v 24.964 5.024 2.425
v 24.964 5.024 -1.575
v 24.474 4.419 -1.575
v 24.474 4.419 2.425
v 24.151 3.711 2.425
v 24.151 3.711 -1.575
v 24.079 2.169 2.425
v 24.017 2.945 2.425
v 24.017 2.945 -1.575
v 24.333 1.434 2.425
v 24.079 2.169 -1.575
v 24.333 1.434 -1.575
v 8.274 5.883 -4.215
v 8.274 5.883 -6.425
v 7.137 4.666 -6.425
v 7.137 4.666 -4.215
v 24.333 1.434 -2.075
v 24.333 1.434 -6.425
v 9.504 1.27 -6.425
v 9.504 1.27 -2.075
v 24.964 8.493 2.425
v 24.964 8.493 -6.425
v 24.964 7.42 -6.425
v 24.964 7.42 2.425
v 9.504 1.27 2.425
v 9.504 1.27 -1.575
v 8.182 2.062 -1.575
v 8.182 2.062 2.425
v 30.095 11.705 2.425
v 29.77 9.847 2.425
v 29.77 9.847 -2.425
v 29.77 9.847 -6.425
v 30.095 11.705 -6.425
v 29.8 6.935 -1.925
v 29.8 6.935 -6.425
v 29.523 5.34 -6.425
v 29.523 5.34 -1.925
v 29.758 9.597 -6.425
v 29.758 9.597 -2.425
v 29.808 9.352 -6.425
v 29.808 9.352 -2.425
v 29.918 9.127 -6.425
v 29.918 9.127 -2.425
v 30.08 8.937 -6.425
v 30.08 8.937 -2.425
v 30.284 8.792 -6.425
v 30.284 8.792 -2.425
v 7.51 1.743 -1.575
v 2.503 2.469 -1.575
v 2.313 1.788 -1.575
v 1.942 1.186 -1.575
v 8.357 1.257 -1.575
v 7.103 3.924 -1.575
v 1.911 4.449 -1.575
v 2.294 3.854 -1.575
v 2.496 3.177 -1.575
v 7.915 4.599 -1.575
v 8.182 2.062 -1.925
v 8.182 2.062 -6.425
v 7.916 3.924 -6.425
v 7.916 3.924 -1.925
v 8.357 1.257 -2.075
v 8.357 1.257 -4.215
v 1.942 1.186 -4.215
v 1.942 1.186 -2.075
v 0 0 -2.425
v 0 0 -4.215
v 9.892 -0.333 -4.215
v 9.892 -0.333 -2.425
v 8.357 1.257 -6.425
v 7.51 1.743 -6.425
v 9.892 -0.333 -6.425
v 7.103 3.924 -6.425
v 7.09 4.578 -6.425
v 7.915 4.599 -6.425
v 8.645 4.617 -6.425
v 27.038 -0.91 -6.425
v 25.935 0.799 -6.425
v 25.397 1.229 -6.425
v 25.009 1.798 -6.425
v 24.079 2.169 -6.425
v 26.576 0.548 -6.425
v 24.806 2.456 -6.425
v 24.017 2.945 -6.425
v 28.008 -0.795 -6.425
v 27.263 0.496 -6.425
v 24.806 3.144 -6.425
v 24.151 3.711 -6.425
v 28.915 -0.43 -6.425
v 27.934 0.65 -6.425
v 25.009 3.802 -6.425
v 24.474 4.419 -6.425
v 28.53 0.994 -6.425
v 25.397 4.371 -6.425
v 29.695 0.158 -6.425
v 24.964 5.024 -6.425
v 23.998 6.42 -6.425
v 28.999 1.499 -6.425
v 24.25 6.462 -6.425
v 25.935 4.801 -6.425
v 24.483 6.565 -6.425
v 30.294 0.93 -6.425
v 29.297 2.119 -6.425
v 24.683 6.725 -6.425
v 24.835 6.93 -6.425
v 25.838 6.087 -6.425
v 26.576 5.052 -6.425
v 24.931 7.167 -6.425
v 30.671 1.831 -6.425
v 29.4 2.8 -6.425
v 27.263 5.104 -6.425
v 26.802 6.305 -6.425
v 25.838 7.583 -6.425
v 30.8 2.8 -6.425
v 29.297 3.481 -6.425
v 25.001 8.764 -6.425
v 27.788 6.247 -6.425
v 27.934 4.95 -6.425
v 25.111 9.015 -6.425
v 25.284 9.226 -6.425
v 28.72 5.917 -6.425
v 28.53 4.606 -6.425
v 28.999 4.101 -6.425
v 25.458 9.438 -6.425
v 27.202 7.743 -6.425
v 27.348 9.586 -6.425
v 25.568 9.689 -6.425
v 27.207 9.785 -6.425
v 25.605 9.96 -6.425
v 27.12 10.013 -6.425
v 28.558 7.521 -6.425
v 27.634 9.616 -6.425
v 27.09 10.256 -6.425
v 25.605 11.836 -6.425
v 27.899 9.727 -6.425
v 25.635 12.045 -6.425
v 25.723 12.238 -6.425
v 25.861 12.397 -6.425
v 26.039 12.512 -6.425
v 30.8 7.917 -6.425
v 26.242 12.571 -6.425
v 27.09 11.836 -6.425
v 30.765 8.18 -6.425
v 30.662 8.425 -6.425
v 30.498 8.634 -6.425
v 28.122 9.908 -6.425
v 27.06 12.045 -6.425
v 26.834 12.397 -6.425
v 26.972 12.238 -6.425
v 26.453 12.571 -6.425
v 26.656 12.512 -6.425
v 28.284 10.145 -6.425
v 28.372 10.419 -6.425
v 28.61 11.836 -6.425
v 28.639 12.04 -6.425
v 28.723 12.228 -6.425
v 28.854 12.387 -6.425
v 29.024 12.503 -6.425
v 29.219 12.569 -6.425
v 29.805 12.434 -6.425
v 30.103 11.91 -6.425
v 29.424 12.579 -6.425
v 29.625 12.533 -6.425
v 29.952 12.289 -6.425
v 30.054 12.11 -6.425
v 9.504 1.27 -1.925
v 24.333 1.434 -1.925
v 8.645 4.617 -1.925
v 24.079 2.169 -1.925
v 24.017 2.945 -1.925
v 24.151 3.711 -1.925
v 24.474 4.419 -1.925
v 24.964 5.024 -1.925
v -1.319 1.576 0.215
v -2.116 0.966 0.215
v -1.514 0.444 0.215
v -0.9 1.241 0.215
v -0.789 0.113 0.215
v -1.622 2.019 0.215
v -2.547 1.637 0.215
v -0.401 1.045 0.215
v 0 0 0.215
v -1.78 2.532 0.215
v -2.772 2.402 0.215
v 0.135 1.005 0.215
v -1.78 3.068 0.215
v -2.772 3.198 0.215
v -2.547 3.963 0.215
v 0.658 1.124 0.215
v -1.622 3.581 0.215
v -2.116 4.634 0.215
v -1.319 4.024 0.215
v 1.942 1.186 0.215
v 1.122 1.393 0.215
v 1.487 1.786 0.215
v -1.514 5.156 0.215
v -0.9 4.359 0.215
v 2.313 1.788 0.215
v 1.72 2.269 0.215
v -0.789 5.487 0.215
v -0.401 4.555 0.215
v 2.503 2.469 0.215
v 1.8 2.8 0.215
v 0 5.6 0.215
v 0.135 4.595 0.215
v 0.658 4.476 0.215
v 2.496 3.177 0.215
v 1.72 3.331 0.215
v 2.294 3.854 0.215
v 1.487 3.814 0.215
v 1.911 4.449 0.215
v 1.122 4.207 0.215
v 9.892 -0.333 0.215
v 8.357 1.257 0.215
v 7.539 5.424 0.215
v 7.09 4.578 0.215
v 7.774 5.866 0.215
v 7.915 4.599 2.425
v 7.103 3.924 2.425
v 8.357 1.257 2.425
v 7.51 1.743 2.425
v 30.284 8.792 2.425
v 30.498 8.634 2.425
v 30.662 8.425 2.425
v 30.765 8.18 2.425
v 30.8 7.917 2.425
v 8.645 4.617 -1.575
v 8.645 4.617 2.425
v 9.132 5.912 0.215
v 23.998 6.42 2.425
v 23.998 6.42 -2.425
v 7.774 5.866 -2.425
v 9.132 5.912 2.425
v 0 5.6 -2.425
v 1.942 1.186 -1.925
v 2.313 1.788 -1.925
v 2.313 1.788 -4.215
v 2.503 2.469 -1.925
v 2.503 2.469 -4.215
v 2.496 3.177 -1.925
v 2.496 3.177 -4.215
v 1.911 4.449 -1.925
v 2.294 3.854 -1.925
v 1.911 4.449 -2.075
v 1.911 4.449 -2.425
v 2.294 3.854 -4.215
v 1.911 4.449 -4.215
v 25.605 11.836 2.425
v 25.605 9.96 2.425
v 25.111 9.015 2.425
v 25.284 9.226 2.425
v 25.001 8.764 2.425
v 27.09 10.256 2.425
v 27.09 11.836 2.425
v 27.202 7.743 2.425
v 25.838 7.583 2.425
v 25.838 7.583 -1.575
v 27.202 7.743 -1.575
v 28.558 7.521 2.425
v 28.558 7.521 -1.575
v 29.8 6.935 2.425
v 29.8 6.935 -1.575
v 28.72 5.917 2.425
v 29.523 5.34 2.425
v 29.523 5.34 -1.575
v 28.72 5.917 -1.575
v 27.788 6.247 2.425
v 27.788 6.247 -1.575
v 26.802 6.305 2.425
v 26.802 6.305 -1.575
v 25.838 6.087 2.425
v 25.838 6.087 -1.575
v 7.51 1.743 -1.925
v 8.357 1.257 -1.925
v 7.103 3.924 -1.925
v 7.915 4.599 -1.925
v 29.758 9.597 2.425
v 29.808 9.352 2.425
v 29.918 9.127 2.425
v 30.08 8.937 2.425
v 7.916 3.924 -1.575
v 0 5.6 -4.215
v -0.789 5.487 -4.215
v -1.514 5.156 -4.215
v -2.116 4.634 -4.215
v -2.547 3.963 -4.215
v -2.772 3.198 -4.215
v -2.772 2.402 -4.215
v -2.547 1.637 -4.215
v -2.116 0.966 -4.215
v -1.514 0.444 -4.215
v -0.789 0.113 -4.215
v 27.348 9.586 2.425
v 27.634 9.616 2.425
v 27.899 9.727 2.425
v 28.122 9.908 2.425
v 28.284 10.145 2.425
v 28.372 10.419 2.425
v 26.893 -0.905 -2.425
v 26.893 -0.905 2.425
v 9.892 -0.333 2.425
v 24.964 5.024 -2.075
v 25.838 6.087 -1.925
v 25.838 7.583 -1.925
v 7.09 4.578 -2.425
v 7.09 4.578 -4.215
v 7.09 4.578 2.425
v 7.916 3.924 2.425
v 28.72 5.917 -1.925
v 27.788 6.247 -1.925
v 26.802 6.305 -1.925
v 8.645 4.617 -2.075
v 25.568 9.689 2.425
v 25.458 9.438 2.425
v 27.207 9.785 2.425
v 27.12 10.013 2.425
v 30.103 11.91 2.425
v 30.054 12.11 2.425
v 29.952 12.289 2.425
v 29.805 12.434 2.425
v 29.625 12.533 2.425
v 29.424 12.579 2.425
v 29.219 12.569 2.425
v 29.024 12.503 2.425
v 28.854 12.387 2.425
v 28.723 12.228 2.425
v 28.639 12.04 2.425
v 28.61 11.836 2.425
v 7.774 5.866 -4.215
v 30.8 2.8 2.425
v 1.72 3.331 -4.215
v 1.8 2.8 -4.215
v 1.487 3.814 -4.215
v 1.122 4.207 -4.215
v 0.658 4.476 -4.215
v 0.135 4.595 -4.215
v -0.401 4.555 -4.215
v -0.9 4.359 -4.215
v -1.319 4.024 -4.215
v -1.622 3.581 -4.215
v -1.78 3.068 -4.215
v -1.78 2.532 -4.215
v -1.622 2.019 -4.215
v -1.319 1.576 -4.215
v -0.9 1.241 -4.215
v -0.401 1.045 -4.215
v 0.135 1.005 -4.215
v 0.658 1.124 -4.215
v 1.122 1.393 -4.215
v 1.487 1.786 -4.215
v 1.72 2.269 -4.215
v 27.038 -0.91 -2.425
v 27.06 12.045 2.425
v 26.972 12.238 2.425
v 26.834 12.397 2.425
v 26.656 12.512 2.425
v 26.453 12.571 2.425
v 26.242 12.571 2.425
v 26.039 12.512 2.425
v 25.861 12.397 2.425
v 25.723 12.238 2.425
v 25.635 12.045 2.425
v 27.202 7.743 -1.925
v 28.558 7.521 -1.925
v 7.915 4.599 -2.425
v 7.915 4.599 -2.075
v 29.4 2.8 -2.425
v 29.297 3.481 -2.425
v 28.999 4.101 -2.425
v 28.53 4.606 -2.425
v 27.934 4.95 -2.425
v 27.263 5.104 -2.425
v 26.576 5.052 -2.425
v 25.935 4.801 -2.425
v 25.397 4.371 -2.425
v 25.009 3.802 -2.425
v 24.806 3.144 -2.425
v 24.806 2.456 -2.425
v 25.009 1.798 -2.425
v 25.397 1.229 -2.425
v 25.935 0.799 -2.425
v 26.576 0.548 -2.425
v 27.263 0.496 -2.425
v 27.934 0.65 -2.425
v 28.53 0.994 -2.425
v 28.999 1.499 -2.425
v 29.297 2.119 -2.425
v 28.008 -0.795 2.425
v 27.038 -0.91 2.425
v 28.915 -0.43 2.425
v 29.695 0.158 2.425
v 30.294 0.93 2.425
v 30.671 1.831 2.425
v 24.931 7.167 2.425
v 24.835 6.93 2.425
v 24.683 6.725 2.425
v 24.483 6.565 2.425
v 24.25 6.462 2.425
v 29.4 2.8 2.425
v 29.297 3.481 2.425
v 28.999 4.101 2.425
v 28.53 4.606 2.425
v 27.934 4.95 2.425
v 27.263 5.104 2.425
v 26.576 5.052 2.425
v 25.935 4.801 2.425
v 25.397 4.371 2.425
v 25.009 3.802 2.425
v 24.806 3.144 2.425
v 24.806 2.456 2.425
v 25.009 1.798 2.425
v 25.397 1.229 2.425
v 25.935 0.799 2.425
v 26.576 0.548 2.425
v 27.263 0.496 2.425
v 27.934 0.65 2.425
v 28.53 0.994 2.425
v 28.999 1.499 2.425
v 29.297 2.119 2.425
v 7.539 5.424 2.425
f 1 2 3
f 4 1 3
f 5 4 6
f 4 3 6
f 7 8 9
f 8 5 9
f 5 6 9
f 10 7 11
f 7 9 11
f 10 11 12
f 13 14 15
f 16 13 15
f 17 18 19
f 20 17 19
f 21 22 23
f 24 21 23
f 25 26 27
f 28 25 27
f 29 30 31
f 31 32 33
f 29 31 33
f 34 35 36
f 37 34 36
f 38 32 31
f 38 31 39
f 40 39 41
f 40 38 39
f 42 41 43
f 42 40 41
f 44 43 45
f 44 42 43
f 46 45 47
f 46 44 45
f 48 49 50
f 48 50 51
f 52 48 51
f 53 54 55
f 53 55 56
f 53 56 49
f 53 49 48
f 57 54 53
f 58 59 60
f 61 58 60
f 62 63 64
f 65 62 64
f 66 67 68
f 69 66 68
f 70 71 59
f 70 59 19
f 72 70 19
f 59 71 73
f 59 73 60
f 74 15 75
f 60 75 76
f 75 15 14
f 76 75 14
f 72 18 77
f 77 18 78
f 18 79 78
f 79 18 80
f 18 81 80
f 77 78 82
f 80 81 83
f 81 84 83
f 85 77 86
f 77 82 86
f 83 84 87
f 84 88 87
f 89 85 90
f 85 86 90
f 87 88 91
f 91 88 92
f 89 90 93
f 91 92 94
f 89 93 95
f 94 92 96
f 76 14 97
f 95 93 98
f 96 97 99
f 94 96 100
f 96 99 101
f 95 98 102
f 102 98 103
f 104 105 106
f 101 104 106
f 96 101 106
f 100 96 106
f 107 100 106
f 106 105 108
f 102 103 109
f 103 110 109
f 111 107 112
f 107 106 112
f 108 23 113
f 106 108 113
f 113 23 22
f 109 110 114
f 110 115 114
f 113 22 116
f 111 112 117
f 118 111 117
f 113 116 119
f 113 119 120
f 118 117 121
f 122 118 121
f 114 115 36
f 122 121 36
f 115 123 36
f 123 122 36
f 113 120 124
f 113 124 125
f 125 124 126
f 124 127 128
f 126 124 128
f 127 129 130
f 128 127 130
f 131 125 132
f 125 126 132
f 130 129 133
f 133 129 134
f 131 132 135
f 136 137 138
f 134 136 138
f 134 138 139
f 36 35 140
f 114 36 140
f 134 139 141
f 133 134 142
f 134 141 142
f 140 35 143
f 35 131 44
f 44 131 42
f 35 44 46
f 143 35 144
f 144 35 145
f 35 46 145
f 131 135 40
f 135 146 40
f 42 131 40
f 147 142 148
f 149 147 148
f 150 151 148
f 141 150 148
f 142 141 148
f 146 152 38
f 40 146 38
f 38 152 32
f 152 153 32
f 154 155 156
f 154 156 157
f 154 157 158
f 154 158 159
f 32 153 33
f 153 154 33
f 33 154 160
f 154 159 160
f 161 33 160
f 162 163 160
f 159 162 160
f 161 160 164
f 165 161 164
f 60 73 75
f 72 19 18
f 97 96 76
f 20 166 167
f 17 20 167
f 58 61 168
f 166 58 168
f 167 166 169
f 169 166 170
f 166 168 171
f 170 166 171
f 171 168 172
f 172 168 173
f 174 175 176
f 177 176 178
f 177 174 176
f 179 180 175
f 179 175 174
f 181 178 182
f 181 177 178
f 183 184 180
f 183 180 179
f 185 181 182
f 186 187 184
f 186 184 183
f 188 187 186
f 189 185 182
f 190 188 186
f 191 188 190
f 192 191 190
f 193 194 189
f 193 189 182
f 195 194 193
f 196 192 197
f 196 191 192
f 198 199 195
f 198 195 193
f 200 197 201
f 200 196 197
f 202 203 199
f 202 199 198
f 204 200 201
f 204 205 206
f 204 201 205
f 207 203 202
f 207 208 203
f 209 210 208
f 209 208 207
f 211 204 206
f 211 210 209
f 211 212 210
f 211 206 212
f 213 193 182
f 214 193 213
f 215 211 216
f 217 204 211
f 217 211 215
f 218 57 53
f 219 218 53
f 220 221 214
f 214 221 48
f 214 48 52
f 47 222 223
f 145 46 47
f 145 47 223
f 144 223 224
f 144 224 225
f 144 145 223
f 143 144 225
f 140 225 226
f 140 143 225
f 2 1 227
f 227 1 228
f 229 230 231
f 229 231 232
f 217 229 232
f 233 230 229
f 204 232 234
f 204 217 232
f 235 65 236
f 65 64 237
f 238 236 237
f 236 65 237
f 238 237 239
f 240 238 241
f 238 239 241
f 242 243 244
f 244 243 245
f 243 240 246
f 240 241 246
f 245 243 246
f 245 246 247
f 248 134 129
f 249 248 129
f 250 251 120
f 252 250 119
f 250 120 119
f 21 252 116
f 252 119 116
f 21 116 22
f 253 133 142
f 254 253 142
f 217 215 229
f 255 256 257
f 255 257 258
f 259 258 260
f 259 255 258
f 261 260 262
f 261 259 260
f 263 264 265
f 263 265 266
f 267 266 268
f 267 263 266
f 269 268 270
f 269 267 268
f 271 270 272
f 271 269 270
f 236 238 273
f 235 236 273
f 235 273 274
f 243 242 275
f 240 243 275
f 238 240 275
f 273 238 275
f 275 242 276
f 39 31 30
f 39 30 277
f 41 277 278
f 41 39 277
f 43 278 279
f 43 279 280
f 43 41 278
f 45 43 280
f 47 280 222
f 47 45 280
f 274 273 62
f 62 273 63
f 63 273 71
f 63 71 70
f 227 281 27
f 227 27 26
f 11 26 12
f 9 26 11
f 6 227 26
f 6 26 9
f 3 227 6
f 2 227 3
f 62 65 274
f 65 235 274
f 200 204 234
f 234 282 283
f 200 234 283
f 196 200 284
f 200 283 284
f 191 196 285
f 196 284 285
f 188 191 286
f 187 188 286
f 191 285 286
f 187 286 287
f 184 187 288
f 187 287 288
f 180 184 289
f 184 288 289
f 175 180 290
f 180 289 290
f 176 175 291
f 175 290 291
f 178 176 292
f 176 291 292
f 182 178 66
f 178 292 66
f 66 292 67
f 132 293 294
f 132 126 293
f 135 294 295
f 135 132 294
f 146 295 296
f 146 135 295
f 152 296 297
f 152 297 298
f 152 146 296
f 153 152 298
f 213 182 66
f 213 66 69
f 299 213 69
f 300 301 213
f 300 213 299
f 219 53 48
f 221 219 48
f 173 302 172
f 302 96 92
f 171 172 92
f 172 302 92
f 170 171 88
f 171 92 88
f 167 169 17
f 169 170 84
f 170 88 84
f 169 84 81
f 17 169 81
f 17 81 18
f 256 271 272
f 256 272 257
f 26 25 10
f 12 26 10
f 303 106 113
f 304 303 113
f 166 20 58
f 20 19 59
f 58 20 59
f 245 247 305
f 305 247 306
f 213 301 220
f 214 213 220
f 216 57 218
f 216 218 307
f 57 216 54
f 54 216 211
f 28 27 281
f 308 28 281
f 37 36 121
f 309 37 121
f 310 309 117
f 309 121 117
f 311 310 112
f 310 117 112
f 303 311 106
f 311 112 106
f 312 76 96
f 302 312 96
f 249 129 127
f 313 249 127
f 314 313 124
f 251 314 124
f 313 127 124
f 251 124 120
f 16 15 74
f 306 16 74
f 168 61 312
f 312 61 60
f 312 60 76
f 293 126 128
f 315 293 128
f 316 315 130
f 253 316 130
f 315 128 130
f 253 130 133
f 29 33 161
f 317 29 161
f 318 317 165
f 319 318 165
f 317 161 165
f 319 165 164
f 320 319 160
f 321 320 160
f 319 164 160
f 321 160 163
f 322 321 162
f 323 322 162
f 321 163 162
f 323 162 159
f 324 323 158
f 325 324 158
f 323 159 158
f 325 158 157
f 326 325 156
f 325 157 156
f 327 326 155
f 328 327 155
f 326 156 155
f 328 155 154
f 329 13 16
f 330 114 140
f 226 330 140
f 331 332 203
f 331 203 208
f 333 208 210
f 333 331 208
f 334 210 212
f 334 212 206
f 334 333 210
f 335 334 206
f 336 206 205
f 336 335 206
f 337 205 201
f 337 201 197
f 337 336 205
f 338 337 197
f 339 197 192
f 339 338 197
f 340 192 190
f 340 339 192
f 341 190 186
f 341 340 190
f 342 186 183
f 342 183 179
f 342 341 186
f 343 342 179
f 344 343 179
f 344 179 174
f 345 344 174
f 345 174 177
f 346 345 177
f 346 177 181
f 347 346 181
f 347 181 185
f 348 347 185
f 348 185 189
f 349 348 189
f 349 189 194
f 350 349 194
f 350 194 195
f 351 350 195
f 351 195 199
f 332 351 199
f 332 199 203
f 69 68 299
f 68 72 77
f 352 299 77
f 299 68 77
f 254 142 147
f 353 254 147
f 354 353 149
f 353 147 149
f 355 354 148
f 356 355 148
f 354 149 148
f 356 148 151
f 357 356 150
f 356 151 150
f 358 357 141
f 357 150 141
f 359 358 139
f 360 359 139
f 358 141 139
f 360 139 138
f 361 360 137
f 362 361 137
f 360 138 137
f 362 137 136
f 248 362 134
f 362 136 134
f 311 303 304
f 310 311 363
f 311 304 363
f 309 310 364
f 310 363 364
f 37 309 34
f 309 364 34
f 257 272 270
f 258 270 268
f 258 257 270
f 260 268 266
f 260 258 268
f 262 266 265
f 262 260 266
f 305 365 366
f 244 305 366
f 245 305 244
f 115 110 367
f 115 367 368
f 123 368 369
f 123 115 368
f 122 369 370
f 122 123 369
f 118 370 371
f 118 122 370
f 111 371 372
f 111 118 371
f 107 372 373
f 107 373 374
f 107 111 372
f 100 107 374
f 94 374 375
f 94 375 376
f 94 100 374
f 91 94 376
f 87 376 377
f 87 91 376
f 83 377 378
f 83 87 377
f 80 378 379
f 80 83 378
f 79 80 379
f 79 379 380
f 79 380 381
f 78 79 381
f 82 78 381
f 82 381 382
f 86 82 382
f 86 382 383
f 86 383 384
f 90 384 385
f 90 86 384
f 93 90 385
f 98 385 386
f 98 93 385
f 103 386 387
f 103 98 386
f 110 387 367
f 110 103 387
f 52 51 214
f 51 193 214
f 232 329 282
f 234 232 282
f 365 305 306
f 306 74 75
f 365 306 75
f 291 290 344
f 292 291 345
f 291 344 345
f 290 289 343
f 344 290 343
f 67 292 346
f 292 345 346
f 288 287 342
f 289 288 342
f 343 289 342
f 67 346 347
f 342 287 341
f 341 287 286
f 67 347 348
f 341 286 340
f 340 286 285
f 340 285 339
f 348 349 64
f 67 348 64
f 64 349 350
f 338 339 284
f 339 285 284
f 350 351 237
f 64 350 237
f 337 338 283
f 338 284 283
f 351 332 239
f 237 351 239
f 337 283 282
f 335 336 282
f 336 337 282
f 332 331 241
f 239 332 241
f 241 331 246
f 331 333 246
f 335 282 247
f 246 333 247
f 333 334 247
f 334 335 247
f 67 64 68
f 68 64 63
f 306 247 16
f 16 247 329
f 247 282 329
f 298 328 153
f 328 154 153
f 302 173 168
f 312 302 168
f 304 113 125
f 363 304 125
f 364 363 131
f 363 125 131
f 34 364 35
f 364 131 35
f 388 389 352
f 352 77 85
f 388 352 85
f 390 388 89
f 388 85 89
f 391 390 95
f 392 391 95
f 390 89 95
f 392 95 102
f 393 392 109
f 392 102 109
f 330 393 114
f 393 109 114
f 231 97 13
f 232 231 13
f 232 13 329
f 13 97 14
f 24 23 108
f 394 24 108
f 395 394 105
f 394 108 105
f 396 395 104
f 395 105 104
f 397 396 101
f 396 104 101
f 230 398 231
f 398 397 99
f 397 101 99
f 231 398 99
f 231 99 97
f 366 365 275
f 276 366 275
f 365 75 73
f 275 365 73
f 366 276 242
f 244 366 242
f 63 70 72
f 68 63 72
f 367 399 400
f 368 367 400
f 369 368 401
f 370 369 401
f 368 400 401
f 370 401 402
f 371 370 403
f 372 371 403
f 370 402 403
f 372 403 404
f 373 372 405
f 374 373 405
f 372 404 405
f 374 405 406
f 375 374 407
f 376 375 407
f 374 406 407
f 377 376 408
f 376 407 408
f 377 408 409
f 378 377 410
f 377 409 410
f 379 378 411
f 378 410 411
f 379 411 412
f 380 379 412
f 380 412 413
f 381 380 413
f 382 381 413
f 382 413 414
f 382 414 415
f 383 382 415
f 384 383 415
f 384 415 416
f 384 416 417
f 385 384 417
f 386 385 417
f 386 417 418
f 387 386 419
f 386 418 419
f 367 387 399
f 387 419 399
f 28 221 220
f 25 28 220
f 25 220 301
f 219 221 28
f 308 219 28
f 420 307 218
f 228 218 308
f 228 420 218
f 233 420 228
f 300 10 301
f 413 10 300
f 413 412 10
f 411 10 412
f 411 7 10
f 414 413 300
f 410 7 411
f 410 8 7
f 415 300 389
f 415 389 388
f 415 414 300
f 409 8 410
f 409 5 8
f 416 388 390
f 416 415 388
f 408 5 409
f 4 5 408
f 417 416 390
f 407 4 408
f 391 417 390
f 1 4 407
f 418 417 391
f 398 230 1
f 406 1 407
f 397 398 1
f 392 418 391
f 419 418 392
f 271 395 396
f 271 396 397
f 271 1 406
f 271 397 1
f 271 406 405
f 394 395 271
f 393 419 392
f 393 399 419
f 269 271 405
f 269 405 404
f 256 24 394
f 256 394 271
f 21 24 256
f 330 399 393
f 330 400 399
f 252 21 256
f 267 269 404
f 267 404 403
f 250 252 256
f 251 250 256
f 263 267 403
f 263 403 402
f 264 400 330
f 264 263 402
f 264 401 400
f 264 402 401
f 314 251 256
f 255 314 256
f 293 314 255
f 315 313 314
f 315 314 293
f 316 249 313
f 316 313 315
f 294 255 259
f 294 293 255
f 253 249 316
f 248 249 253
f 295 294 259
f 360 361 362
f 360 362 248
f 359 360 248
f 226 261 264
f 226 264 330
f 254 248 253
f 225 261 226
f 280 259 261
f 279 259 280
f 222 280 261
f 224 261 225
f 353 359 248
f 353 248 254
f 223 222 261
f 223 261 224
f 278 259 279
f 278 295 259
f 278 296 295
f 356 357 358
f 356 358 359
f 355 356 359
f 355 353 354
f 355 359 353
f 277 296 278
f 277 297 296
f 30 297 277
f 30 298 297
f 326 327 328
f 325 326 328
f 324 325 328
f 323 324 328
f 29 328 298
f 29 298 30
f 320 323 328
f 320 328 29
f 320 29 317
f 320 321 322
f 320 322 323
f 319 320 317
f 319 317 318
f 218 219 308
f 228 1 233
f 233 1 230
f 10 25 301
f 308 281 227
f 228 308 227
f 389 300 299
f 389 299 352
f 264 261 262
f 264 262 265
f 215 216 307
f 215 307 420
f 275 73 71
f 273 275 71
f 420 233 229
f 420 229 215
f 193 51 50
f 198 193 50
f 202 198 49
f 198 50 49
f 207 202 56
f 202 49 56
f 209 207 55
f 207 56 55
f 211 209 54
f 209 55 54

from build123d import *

# Parameters (mm, degrees)
BOSS_EXTRUDE1_DEPTH = 2.425
SKETCH4_R           = 1.8
CUT_EXTRUDE1_DEPTH  = 4.85
SKETCH5_R           = 2.31
CUT_EXTRUDE2_DEPTH  = 4.85
CUT_EXTRUDE3_DEPTH  = 4.5
CUT_EXTRUDE4_DEPTH  = 4.5
SKETCH9_R           = 1.8
CUT_EXTRUDE5_DEPTH  = 2.21
BOSS_EXTRUDE3_DEPTH = 4.5
MIRROR1_START       = -2.425
MIRROR1_DEPTH       = 0.35
MIRROR1_START_2     = -6.425
MIRROR1_2_OUTLINE_R = 2.31
MIRROR1_2_DEPTH     = 4
MIRROR1_START_3     = -4.215
MIRROR1_3_OUTLINE_R = 1.8
MIRROR1_3_DEPTH     = 1.79
MIRROR1_START_4     = -1.925
MIRROR1_4_DEPTH     = 0.35
FILLET1_R           = 1
FILLET2_R           = 1
FILLET3_START       = -7
FILLET3_DEPTH       = 10
FILLET3_START_2     = -6.425
FILLET3_2_DEPTH     = 8.85
CHAMFER1_SIZE       = 1.358599734
CHAMFER1_SIZE_2     = 0.5


with BuildPart() as part:
    # Sketch1 → Boss-Extrude1 (new, symmetric)
    with BuildSketch(Plane.XY):
        with BuildLine():
            Line((24.963832459, 6.453496101), (0, 5.6))
            ThreePointArc((0, 5.6), (-2.8, 2.8), (0, 0))
            Line((0, 0), (26.892949189, -0.904763282))
            Line((26.892949189, -0.904763282), (27.037607331, -0.909630037))
            ThreePointArc((27.037607331, -0.909630037), (29.694776689, 0.158175176), (30.8, 2.8))
            Line((30.8, 2.8), (30.8, 8.487357946))
            ThreePointArc((30.8, 8.487357946), (30.233700276, 8.818910947), (29.638041523, 9.094253316))
            Line((29.638041523, 9.094253316), (30.095317445, 11.704815446))
            ThreePointArc((30.095317445, 11.704815446), (29.424398151, 12.579078458), (28.61033706, 11.836264178))
            Line((28.61033706, 11.836264178), (28.216646516, 9.496327952))
            ThreePointArc((28.216646516, 9.496327952), (27.655285404, 9.566874672), (27.09, 9.590444787))
            Line((27.09, 9.590444787), (27.09, 11.836264178))
            ThreePointArc((27.09, 11.836264178), (26.347509808, 12.578754371), (25.605019615, 11.836264178))
            Line((25.605019615, 11.836264178), (25.605019615, 9.42608283))
            ThreePointArc((25.605019615, 9.42608283), (25.282256308, 9.345395569), (24.963832459, 9.248996201))
            Line((24.963832459, 9.248996201), (24.963832459, 6.453496101))
        make_face()
    extrude(amount=BOSS_EXTRUDE1_DEPTH, both=True)

    # Sketch4 → Cut-Extrude1 (cut)
    with BuildSketch(Plane.XY.offset(2.425)):
        with Locations((0, 2.8)):
            Circle(SKETCH4_R)
    extrude(amount=-CUT_EXTRUDE1_DEPTH, mode=Mode.SUBTRACT)

    # Sketch5 → Cut-Extrude2 (cut)
    with BuildSketch(Plane.XY.offset(2.425)):
        with Locations((27.09, 2.8)):
            Circle(SKETCH5_R)
    extrude(amount=-CUT_EXTRUDE2_DEPTH, mode=Mode.SUBTRACT)

    # Sketch6 → Cut-Extrude3 (cut)
    with BuildSketch(Plane.XY.offset(2.425)):
        with BuildLine():
            Line((24.963832459, 5.0237994), (1.911495606, 4.449077446))
            ThreePointArc((1.911495606, 4.449077446), (2.524426686, 2.823276198), (1.941578309, 1.186449398))
            Line((1.941578309, 1.186449398), (24.333229734, 1.433950995))
            ThreePointArc((24.333229734, 1.433950995), (24.059732141, 3.332305254), (24.963832459, 5.0237994))
        make_face()
    extrude(amount=-CUT_EXTRUDE3_DEPTH, mode=Mode.SUBTRACT)

    # Sketch8 → Cut-Extrude4 (cut)
    with BuildSketch(Plane.XY.offset(2.425)):
        with BuildLine():
            Line((25.837871482, 6.086629038), (25.837871482, 7.582656824))
            ThreePointArc((25.837871482, 7.582656824), (27.887646092, 7.679077048), (29.8, 6.934916217))
            Line((29.8, 6.934916217), (29.522559256, 5.340159783))
            ThreePointArc((29.522559256, 5.340159783), (27.788325332, 6.247041919), (25.837871482, 6.086629038))
        make_face()
    extrude(amount=-CUT_EXTRUDE4_DEPTH, mode=Mode.SUBTRACT)

    # Sketch9 → Cut-Extrude5 (cut)
    # profile 1 of 2: a face of its own
    with BuildSketch(Plane.XY.offset(2.425)):
        with BuildLine():
            Line((0, 0), (9.892061467, -0.332800019))
            Line((9.892061467, -0.332800019), (8.357170093, 1.257362846))
            Line((8.357170093, 1.257362846), (1.941578309, 1.186449398))
            ThreePointArc((1.941578309, 1.186449398), (2.524426686, 2.823276198), (1.911495606, 4.449077446))
            Line((1.911495606, 4.449077446), (7.090480564, 4.578195651))
            Line((7.090480564, 4.578195651), (7.773891231, 5.865783944))
            Line((7.773891231, 5.865783944), (0, 5.6))
            ThreePointArc((0, 5.6), (-2.8, 2.8), (0, 0))
        make_face()
        with Locations((0, 2.8)):
            Circle(SKETCH9_R, mode=Mode.SUBTRACT)
    # profile 2 of 2: a face of its own
    with BuildSketch(Plane.XY.offset(2.425)):
        with BuildLine():
            Line((1.941578309, 1.186449398), (8.357170093, 1.257362846))
            Line((8.357170093, 1.257362846), (7.887025479, 1.744437384))
            Line((7.887025479, 1.744437384), (7.047687655, 3.249473755))
            Line((7.047687655, 3.249473755), (8.459620317, 4.61232992))
            Line((8.459620317, 4.61232992), (7.090480564, 4.578195651))
            Line((7.090480564, 4.578195651), (1.911495606, 4.449077446))
            ThreePointArc((1.911495606, 4.449077446), (2.524426686, 2.823276198), (1.941578309, 1.186449398))
        make_face()
    extrude(amount=-CUT_EXTRUDE5_DEPTH, mode=Mode.SUBTRACT)

    # Sketch10 → Boss-Extrude3 (add)
    with BuildSketch(Plane.XY.offset(-2.075)):
        Polygon((7.915156926, 4.598755806), (7.103101675, 3.924375939), (7.5095709, 1.743316184), (8.357170093, 1.257362846), (9.503707682, 1.270035867), (8.181661024, 2.062082336), (7.916040126, 3.924375939), (8.644746772, 4.616945341), align=None)
    extrude(amount=BOSS_EXTRUDE3_DEPTH)

    # Mirror1: read off the stored shape, not the designer's step
    # Mirror1 outline → Mirror1 (cut)
    with BuildSketch(Plane.XY.offset(MIRROR1_START)):
        with BuildLine():
            ThreePointArc((24.333229734, 1.433950995), (24.059732141, 3.332305255), (24.963832459, 5.0237994))
            Line((24.963832459, 5.0237994), (8.644746772, 4.616945341))
            Line((8.644746772, 4.616945341), (7.916040126, 3.924375939))
            Line((7.916040126, 3.924375939), (8.181661024, 2.062082336))
            Line((8.181661024, 2.062082336), (9.503707682, 1.270035867))
            Line((9.503707682, 1.270035867), (24.333229734, 1.433950995))
        make_face()
        with BuildLine():
            Line((7.103101675, 3.924375939), (7.915156926, 4.598755806))
            Line((7.915156926, 4.598755806), (1.911495606, 4.449077446))
            ThreePointArc((1.911495606, 4.449077446), (2.524426686, 2.823276198), (1.941578309, 1.186449398))
            Line((1.941578309, 1.186449398), (8.357170093, 1.257362846))
            Line((8.357170093, 1.257362846), (7.5095709, 1.743316184))
            Line((7.5095709, 1.743316184), (7.103101675, 3.924375939))
        make_face()
        with BuildLine():
            Line((25.837871482, 7.582656824), (25.837871482, 6.086629038))
            ThreePointArc((25.837871482, 6.086629038), (27.788325332, 6.247041919), (29.522559256, 5.340159783))
            Line((29.522559256, 5.340159783), (29.8, 6.934916217))
            ThreePointArc((29.8, 6.934916217), (27.887646092, 7.679077048), (25.837871482, 7.582656824))
        make_face()
    extrude(amount=MIRROR1_DEPTH, mode=Mode.SUBTRACT)

    # Mirror1 2 outline → Mirror1 2 (add)
    with BuildSketch(Plane.XY.offset(MIRROR1_START_2)):
        with BuildLine():
            Line((7.090480564, 4.578195651), (7.915156926, 4.598755806))
            Line((7.915156926, 4.598755806), (7.103101675, 3.924375939))
            Line((7.103101675, 3.924375939), (7.5095709, 1.743316184))
            Line((7.5095709, 1.743316184), (8.357170093, 1.257362846))
            Line((8.357170093, 1.257362846), (9.892061467, -0.332800019))
            Line((9.892061467, -0.332800019), (27.037607331, -0.909630037))
            ThreePointArc((27.037607331, -0.909630037), (29.694776689, 0.158175176), (30.8, 2.8))
            Line((30.8, 2.8), (30.8, 8.487357946))
            ThreePointArc((30.8, 8.487357946), (30.233700276, 8.818910947), (29.638041523, 9.094253316))
            Line((29.638041523, 9.094253316), (30.095317445, 11.704815446))
            ThreePointArc((30.095317445, 11.704815446), (29.424398151, 12.579078458), (28.61033706, 11.836264178))
            Line((28.61033706, 11.836264178), (28.216646516, 9.496327952))
            ThreePointArc((28.216646516, 9.496327952), (27.655285404, 9.566874672), (27.09, 9.590444787))
            Line((27.09, 9.590444787), (27.09, 11.836264178))
            ThreePointArc((27.09, 11.836264178), (26.347509807, 12.578754371), (25.605019615, 11.836264178))
            Line((25.605019615, 11.836264178), (25.605019615, 9.42608283))
            ThreePointArc((25.605019615, 9.42608283), (25.282256308, 9.345395569), (24.963832459, 9.248996201))
            Line((24.963832459, 9.248996201), (24.963832459, 6.453496101))
            Line((24.963832459, 6.453496101), (7.773891231, 5.865783944))
            Line((7.773891231, 5.865783944), (7.090480564, 4.578195651))
        make_face()
        with BuildLine():
            Line((8.644746772, 4.616945341), (24.963832459, 5.0237994))
            ThreePointArc((24.963832459, 5.0237994), (24.059732141, 3.332305255), (24.333229734, 1.433950995))
            Line((24.333229734, 1.433950995), (9.503707682, 1.270035867))
            Line((9.503707682, 1.270035867), (8.181661024, 2.062082336))
            Line((8.181661024, 2.062082336), (7.916040126, 3.924375939))
            Line((7.916040126, 3.924375939), (8.644746772, 4.616945341))
        make_face(mode=Mode.SUBTRACT)
        with Locations((27.09, 2.8)):
            Circle(MIRROR1_2_OUTLINE_R, mode=Mode.SUBTRACT)
        with BuildLine():
            ThreePointArc((29.522559256, 5.340159783), (27.788325332, 6.247041919), (25.837871482, 6.086629038))
            Line((25.837871482, 6.086629038), (25.837871482, 7.582656824))
            ThreePointArc((25.837871482, 7.582656824), (27.887646092, 7.679077048), (29.8, 6.934916217))
            Line((29.8, 6.934916217), (29.522559256, 5.340159783))
        make_face(mode=Mode.SUBTRACT)
    extrude(amount=MIRROR1_2_DEPTH)

    # Mirror1 3 outline → Mirror1 3 (add)
    with BuildSketch(Plane.XY.offset(MIRROR1_START_3)):
        with BuildLine():
            Line((1.911495606, 4.449077446), (7.090480564, 4.578195651))
            Line((7.090480564, 4.578195651), (7.773891231, 5.865783944))
            Line((7.773891231, 5.865783944), (0, 5.6))
            ThreePointArc((0, 5.6), (-2.8, 2.8), (0, 0))
            Line((0, 0), (9.892061467, -0.332800019))
            Line((9.892061467, -0.332800019), (8.357170093, 1.257362846))
            Line((8.357170093, 1.257362846), (1.941578309, 1.186449398))
            ThreePointArc((1.941578309, 1.186449398), (2.524426686, 2.823276198), (1.911495606, 4.449077446))
        make_face()
        with Locations((0, 2.8)):
            Circle(MIRROR1_3_OUTLINE_R, mode=Mode.SUBTRACT)
    extrude(amount=MIRROR1_3_DEPTH)

    # Mirror1 4 outline → Mirror1 4 (add)
    with BuildSketch(Plane.XY.offset(MIRROR1_START_4)):
        with BuildLine():
            ThreePointArc((24.333229734, 1.433950995), (24.059732141, 3.332305255), (24.963832459, 5.0237994))
            Line((24.963832459, 5.0237994), (8.644746772, 4.616945341))
            Line((8.644746772, 4.616945341), (7.916040126, 3.924375939))
            Line((7.916040126, 3.924375939), (8.181661024, 2.062082336))
            Line((8.181661024, 2.062082336), (9.503707682, 1.270035867))
            Line((9.503707682, 1.270035867), (24.333229734, 1.433950995))
        make_face()
        with BuildLine():
            Line((7.103101675, 3.924375939), (7.915156926, 4.598755806))
            Line((7.915156926, 4.598755806), (1.911495606, 4.449077446))
            ThreePointArc((1.911495606, 4.449077446), (2.524426686, 2.823276198), (1.941578309, 1.186449398))
            Line((1.941578309, 1.186449398), (8.357170093, 1.257362846))
            Line((8.357170093, 1.257362846), (7.5095709, 1.743316184))
            Line((7.5095709, 1.743316184), (7.103101675, 3.924375939))
        make_face()
        with BuildLine():
            Line((25.837871482, 7.582656824), (25.837871482, 6.086629038))
            ThreePointArc((25.837871482, 6.086629038), (27.788325332, 6.247041919), (29.522559256, 5.340159783))
            Line((29.522559256, 5.340159783), (29.8, 6.934916217))
            ThreePointArc((29.8, 6.934916217), (27.887646092, 7.679077048), (25.837871482, 7.582656824))
        make_face()
    extrude(amount=MIRROR1_4_DEPTH)

    # Fillet1
    fillet1_edges = [part.edges().sort_by_distance(p)[0] for p in [
        (28.216646516, 9.496327952, 0),
    ]]
    fillet(fillet1_edges, radius=FILLET1_R)

    # Fillet2
    # the kernel refuses this fillet: 1 mm, written as the material it adds along each edge
    with BuildSketch(Plane(origin=(29.638041523, 9.094253316, -2.425), x_dir=(0.1725368564682428, 0.9850030625130345, 0), z_dir=(0, 0, 1))) as fillet2_piece_1:
        with BuildLine():
            CenterArc((0.764295599, -1), FILLET2_R, 90, 71.872680982)
            ThreePointArc((-0.186071892, -0.688870393), (-0.08398115, -0.346881002), (0, 0))
            Line((0, 0), (0.764295599, 0))
        make_face()
    extrude(amount=4.85)
    with BuildSketch(Plane(origin=(29.638041523, 9.094253316, -6.425), x_dir=(0.1725368564898844, 0.9850030625092436, 0), z_dir=(0, 0, 1))) as fillet2_piece_2:
        with BuildLine():
            CenterArc((0.764295599, -1), FILLET2_R, 90, 71.872680969)
            ThreePointArc((-0.186071892, -0.688870393), (-0.083981149, -0.346881002), (0, 0))
            Line((0, 0), (0.764295599, 0))
        make_face()
    extrude(amount=4)
    # the kernel refuses this fillet: 1 mm, written as the material it takes off along each edge
    with BuildSketch(Plane(origin=(24.963832459, 9.248996201, -8.315807243), x_dir=(-2.562451628141337e-10, -1.0, -3.5674664740127255e-11), z_dir=(-4.379753308299348e-11, -3.567466472890435e-11, 1.0))) as fillet2_2_piece_1:
        with BuildLine():
            CenterArc((0.756322897, 1), FILLET2_R, 201.027306576, 68.972693439)
            ThreePointArc((-0.177086629, 0.641187156), (-0.096399368, 0.31842385), (0, 0))
            Line((0, 0), (0.756322897, 0))
        make_face()
    extrude(amount=12.631614485, mode=Mode.SUBTRACT)

    # Fillet3: read off the stored shape, not the designer's step
    # Fillet3 outline → Fillet3 (cut)
    with BuildSketch(Plane.XY.offset(FILLET3_START)):
        with BuildLine():
            ThreePointArc((30.8, 8.487357946), (30.545599672, 8.645423109), (30.284476711, 8.7921164))
            ThreePointArc((30.284476711, 8.7921164), (30.661523628, 8.424957074), (30.8, 7.917239595))
            Line((30.8, 7.917239595), (30.8, 8.487357946))
        make_face()
    extrude(amount=FILLET3_DEPTH, mode=Mode.SUBTRACT)

    # Fillet3 2 outline → Fillet3 2 (add)
    with BuildSketch(Plane.XY.offset(FILLET3_START_2)):
        with BuildLine():
            Line((25.605019615, 9.42608283), (25.605019615, 9.960197633))
            ThreePointArc((25.605019615, 9.960197633), (25.521372828, 9.559826818), (25.284426037, 9.226435468))
            ThreePointArc((25.284426037, 9.226435468), (25.435212011, 9.341531609), (25.605019615, 9.42608283))
        make_face()
        with BuildLine():
            Line((24.963832459, 6.453496101), (24.963832459, 7.419891079))
            ThreePointArc((24.963832459, 7.419891079), (24.682918455, 6.724969983), (23.9980018, 6.420475021))
            Line((23.9980018, 6.420475021), (24.963832459, 6.453496101))
        make_face()
        with BuildLine():
            ThreePointArc((27.09, 9.590444787), (27.21890802, 9.589221099), (27.347769579, 9.585550475))
            ThreePointArc((27.347769579, 9.585550475), (27.156664471, 9.89668996), (27.09, 10.255695238))
            Line((27.09, 10.255695238), (27.09, 9.590444787))
        make_face()
    extrude(amount=FILLET3_2_DEPTH)

    # Chamfer1
    # the kernel refuses this chamfer: 1.358599734, 1.358599732, 0.5 mm, written as the material it takes off along each edge
    with BuildSketch(Plane(origin=(7.773891231, 5.865783944, 5.952855504), x_dir=(0.9994160575677593, 0.034169341165982005, 0), z_dir=(0, 0, -1))) as chamfer1_piece_1:
        Polygon((CHAMFER1_SIZE * 0.999999998457, 0), (-CHAMFER1_SIZE_2 * 0.498730899085, CHAMFER1_SIZE_2 * 0.866756880733), (0, 0), align=None)
    extrude(amount=5.737855504, mode=Mode.SUBTRACT)
    with BuildSketch(Plane(origin=(7.773891231, 5.865783944, -9.952855511), x_dir=(0.9994160575667841, 0.03416934119450388, 0), z_dir=(0, 0, 1))) as chamfer1_piece_2:
        Polygon((CHAMFER1_SIZE_2, 0), (-CHAMFER1_SIZE * 0.498730899684, -CHAMFER1_SIZE * 0.866756880764), (0, 0), align=None)
    extrude(amount=5.737855511, mode=Mode.SUBTRACT)


solid = part.part
